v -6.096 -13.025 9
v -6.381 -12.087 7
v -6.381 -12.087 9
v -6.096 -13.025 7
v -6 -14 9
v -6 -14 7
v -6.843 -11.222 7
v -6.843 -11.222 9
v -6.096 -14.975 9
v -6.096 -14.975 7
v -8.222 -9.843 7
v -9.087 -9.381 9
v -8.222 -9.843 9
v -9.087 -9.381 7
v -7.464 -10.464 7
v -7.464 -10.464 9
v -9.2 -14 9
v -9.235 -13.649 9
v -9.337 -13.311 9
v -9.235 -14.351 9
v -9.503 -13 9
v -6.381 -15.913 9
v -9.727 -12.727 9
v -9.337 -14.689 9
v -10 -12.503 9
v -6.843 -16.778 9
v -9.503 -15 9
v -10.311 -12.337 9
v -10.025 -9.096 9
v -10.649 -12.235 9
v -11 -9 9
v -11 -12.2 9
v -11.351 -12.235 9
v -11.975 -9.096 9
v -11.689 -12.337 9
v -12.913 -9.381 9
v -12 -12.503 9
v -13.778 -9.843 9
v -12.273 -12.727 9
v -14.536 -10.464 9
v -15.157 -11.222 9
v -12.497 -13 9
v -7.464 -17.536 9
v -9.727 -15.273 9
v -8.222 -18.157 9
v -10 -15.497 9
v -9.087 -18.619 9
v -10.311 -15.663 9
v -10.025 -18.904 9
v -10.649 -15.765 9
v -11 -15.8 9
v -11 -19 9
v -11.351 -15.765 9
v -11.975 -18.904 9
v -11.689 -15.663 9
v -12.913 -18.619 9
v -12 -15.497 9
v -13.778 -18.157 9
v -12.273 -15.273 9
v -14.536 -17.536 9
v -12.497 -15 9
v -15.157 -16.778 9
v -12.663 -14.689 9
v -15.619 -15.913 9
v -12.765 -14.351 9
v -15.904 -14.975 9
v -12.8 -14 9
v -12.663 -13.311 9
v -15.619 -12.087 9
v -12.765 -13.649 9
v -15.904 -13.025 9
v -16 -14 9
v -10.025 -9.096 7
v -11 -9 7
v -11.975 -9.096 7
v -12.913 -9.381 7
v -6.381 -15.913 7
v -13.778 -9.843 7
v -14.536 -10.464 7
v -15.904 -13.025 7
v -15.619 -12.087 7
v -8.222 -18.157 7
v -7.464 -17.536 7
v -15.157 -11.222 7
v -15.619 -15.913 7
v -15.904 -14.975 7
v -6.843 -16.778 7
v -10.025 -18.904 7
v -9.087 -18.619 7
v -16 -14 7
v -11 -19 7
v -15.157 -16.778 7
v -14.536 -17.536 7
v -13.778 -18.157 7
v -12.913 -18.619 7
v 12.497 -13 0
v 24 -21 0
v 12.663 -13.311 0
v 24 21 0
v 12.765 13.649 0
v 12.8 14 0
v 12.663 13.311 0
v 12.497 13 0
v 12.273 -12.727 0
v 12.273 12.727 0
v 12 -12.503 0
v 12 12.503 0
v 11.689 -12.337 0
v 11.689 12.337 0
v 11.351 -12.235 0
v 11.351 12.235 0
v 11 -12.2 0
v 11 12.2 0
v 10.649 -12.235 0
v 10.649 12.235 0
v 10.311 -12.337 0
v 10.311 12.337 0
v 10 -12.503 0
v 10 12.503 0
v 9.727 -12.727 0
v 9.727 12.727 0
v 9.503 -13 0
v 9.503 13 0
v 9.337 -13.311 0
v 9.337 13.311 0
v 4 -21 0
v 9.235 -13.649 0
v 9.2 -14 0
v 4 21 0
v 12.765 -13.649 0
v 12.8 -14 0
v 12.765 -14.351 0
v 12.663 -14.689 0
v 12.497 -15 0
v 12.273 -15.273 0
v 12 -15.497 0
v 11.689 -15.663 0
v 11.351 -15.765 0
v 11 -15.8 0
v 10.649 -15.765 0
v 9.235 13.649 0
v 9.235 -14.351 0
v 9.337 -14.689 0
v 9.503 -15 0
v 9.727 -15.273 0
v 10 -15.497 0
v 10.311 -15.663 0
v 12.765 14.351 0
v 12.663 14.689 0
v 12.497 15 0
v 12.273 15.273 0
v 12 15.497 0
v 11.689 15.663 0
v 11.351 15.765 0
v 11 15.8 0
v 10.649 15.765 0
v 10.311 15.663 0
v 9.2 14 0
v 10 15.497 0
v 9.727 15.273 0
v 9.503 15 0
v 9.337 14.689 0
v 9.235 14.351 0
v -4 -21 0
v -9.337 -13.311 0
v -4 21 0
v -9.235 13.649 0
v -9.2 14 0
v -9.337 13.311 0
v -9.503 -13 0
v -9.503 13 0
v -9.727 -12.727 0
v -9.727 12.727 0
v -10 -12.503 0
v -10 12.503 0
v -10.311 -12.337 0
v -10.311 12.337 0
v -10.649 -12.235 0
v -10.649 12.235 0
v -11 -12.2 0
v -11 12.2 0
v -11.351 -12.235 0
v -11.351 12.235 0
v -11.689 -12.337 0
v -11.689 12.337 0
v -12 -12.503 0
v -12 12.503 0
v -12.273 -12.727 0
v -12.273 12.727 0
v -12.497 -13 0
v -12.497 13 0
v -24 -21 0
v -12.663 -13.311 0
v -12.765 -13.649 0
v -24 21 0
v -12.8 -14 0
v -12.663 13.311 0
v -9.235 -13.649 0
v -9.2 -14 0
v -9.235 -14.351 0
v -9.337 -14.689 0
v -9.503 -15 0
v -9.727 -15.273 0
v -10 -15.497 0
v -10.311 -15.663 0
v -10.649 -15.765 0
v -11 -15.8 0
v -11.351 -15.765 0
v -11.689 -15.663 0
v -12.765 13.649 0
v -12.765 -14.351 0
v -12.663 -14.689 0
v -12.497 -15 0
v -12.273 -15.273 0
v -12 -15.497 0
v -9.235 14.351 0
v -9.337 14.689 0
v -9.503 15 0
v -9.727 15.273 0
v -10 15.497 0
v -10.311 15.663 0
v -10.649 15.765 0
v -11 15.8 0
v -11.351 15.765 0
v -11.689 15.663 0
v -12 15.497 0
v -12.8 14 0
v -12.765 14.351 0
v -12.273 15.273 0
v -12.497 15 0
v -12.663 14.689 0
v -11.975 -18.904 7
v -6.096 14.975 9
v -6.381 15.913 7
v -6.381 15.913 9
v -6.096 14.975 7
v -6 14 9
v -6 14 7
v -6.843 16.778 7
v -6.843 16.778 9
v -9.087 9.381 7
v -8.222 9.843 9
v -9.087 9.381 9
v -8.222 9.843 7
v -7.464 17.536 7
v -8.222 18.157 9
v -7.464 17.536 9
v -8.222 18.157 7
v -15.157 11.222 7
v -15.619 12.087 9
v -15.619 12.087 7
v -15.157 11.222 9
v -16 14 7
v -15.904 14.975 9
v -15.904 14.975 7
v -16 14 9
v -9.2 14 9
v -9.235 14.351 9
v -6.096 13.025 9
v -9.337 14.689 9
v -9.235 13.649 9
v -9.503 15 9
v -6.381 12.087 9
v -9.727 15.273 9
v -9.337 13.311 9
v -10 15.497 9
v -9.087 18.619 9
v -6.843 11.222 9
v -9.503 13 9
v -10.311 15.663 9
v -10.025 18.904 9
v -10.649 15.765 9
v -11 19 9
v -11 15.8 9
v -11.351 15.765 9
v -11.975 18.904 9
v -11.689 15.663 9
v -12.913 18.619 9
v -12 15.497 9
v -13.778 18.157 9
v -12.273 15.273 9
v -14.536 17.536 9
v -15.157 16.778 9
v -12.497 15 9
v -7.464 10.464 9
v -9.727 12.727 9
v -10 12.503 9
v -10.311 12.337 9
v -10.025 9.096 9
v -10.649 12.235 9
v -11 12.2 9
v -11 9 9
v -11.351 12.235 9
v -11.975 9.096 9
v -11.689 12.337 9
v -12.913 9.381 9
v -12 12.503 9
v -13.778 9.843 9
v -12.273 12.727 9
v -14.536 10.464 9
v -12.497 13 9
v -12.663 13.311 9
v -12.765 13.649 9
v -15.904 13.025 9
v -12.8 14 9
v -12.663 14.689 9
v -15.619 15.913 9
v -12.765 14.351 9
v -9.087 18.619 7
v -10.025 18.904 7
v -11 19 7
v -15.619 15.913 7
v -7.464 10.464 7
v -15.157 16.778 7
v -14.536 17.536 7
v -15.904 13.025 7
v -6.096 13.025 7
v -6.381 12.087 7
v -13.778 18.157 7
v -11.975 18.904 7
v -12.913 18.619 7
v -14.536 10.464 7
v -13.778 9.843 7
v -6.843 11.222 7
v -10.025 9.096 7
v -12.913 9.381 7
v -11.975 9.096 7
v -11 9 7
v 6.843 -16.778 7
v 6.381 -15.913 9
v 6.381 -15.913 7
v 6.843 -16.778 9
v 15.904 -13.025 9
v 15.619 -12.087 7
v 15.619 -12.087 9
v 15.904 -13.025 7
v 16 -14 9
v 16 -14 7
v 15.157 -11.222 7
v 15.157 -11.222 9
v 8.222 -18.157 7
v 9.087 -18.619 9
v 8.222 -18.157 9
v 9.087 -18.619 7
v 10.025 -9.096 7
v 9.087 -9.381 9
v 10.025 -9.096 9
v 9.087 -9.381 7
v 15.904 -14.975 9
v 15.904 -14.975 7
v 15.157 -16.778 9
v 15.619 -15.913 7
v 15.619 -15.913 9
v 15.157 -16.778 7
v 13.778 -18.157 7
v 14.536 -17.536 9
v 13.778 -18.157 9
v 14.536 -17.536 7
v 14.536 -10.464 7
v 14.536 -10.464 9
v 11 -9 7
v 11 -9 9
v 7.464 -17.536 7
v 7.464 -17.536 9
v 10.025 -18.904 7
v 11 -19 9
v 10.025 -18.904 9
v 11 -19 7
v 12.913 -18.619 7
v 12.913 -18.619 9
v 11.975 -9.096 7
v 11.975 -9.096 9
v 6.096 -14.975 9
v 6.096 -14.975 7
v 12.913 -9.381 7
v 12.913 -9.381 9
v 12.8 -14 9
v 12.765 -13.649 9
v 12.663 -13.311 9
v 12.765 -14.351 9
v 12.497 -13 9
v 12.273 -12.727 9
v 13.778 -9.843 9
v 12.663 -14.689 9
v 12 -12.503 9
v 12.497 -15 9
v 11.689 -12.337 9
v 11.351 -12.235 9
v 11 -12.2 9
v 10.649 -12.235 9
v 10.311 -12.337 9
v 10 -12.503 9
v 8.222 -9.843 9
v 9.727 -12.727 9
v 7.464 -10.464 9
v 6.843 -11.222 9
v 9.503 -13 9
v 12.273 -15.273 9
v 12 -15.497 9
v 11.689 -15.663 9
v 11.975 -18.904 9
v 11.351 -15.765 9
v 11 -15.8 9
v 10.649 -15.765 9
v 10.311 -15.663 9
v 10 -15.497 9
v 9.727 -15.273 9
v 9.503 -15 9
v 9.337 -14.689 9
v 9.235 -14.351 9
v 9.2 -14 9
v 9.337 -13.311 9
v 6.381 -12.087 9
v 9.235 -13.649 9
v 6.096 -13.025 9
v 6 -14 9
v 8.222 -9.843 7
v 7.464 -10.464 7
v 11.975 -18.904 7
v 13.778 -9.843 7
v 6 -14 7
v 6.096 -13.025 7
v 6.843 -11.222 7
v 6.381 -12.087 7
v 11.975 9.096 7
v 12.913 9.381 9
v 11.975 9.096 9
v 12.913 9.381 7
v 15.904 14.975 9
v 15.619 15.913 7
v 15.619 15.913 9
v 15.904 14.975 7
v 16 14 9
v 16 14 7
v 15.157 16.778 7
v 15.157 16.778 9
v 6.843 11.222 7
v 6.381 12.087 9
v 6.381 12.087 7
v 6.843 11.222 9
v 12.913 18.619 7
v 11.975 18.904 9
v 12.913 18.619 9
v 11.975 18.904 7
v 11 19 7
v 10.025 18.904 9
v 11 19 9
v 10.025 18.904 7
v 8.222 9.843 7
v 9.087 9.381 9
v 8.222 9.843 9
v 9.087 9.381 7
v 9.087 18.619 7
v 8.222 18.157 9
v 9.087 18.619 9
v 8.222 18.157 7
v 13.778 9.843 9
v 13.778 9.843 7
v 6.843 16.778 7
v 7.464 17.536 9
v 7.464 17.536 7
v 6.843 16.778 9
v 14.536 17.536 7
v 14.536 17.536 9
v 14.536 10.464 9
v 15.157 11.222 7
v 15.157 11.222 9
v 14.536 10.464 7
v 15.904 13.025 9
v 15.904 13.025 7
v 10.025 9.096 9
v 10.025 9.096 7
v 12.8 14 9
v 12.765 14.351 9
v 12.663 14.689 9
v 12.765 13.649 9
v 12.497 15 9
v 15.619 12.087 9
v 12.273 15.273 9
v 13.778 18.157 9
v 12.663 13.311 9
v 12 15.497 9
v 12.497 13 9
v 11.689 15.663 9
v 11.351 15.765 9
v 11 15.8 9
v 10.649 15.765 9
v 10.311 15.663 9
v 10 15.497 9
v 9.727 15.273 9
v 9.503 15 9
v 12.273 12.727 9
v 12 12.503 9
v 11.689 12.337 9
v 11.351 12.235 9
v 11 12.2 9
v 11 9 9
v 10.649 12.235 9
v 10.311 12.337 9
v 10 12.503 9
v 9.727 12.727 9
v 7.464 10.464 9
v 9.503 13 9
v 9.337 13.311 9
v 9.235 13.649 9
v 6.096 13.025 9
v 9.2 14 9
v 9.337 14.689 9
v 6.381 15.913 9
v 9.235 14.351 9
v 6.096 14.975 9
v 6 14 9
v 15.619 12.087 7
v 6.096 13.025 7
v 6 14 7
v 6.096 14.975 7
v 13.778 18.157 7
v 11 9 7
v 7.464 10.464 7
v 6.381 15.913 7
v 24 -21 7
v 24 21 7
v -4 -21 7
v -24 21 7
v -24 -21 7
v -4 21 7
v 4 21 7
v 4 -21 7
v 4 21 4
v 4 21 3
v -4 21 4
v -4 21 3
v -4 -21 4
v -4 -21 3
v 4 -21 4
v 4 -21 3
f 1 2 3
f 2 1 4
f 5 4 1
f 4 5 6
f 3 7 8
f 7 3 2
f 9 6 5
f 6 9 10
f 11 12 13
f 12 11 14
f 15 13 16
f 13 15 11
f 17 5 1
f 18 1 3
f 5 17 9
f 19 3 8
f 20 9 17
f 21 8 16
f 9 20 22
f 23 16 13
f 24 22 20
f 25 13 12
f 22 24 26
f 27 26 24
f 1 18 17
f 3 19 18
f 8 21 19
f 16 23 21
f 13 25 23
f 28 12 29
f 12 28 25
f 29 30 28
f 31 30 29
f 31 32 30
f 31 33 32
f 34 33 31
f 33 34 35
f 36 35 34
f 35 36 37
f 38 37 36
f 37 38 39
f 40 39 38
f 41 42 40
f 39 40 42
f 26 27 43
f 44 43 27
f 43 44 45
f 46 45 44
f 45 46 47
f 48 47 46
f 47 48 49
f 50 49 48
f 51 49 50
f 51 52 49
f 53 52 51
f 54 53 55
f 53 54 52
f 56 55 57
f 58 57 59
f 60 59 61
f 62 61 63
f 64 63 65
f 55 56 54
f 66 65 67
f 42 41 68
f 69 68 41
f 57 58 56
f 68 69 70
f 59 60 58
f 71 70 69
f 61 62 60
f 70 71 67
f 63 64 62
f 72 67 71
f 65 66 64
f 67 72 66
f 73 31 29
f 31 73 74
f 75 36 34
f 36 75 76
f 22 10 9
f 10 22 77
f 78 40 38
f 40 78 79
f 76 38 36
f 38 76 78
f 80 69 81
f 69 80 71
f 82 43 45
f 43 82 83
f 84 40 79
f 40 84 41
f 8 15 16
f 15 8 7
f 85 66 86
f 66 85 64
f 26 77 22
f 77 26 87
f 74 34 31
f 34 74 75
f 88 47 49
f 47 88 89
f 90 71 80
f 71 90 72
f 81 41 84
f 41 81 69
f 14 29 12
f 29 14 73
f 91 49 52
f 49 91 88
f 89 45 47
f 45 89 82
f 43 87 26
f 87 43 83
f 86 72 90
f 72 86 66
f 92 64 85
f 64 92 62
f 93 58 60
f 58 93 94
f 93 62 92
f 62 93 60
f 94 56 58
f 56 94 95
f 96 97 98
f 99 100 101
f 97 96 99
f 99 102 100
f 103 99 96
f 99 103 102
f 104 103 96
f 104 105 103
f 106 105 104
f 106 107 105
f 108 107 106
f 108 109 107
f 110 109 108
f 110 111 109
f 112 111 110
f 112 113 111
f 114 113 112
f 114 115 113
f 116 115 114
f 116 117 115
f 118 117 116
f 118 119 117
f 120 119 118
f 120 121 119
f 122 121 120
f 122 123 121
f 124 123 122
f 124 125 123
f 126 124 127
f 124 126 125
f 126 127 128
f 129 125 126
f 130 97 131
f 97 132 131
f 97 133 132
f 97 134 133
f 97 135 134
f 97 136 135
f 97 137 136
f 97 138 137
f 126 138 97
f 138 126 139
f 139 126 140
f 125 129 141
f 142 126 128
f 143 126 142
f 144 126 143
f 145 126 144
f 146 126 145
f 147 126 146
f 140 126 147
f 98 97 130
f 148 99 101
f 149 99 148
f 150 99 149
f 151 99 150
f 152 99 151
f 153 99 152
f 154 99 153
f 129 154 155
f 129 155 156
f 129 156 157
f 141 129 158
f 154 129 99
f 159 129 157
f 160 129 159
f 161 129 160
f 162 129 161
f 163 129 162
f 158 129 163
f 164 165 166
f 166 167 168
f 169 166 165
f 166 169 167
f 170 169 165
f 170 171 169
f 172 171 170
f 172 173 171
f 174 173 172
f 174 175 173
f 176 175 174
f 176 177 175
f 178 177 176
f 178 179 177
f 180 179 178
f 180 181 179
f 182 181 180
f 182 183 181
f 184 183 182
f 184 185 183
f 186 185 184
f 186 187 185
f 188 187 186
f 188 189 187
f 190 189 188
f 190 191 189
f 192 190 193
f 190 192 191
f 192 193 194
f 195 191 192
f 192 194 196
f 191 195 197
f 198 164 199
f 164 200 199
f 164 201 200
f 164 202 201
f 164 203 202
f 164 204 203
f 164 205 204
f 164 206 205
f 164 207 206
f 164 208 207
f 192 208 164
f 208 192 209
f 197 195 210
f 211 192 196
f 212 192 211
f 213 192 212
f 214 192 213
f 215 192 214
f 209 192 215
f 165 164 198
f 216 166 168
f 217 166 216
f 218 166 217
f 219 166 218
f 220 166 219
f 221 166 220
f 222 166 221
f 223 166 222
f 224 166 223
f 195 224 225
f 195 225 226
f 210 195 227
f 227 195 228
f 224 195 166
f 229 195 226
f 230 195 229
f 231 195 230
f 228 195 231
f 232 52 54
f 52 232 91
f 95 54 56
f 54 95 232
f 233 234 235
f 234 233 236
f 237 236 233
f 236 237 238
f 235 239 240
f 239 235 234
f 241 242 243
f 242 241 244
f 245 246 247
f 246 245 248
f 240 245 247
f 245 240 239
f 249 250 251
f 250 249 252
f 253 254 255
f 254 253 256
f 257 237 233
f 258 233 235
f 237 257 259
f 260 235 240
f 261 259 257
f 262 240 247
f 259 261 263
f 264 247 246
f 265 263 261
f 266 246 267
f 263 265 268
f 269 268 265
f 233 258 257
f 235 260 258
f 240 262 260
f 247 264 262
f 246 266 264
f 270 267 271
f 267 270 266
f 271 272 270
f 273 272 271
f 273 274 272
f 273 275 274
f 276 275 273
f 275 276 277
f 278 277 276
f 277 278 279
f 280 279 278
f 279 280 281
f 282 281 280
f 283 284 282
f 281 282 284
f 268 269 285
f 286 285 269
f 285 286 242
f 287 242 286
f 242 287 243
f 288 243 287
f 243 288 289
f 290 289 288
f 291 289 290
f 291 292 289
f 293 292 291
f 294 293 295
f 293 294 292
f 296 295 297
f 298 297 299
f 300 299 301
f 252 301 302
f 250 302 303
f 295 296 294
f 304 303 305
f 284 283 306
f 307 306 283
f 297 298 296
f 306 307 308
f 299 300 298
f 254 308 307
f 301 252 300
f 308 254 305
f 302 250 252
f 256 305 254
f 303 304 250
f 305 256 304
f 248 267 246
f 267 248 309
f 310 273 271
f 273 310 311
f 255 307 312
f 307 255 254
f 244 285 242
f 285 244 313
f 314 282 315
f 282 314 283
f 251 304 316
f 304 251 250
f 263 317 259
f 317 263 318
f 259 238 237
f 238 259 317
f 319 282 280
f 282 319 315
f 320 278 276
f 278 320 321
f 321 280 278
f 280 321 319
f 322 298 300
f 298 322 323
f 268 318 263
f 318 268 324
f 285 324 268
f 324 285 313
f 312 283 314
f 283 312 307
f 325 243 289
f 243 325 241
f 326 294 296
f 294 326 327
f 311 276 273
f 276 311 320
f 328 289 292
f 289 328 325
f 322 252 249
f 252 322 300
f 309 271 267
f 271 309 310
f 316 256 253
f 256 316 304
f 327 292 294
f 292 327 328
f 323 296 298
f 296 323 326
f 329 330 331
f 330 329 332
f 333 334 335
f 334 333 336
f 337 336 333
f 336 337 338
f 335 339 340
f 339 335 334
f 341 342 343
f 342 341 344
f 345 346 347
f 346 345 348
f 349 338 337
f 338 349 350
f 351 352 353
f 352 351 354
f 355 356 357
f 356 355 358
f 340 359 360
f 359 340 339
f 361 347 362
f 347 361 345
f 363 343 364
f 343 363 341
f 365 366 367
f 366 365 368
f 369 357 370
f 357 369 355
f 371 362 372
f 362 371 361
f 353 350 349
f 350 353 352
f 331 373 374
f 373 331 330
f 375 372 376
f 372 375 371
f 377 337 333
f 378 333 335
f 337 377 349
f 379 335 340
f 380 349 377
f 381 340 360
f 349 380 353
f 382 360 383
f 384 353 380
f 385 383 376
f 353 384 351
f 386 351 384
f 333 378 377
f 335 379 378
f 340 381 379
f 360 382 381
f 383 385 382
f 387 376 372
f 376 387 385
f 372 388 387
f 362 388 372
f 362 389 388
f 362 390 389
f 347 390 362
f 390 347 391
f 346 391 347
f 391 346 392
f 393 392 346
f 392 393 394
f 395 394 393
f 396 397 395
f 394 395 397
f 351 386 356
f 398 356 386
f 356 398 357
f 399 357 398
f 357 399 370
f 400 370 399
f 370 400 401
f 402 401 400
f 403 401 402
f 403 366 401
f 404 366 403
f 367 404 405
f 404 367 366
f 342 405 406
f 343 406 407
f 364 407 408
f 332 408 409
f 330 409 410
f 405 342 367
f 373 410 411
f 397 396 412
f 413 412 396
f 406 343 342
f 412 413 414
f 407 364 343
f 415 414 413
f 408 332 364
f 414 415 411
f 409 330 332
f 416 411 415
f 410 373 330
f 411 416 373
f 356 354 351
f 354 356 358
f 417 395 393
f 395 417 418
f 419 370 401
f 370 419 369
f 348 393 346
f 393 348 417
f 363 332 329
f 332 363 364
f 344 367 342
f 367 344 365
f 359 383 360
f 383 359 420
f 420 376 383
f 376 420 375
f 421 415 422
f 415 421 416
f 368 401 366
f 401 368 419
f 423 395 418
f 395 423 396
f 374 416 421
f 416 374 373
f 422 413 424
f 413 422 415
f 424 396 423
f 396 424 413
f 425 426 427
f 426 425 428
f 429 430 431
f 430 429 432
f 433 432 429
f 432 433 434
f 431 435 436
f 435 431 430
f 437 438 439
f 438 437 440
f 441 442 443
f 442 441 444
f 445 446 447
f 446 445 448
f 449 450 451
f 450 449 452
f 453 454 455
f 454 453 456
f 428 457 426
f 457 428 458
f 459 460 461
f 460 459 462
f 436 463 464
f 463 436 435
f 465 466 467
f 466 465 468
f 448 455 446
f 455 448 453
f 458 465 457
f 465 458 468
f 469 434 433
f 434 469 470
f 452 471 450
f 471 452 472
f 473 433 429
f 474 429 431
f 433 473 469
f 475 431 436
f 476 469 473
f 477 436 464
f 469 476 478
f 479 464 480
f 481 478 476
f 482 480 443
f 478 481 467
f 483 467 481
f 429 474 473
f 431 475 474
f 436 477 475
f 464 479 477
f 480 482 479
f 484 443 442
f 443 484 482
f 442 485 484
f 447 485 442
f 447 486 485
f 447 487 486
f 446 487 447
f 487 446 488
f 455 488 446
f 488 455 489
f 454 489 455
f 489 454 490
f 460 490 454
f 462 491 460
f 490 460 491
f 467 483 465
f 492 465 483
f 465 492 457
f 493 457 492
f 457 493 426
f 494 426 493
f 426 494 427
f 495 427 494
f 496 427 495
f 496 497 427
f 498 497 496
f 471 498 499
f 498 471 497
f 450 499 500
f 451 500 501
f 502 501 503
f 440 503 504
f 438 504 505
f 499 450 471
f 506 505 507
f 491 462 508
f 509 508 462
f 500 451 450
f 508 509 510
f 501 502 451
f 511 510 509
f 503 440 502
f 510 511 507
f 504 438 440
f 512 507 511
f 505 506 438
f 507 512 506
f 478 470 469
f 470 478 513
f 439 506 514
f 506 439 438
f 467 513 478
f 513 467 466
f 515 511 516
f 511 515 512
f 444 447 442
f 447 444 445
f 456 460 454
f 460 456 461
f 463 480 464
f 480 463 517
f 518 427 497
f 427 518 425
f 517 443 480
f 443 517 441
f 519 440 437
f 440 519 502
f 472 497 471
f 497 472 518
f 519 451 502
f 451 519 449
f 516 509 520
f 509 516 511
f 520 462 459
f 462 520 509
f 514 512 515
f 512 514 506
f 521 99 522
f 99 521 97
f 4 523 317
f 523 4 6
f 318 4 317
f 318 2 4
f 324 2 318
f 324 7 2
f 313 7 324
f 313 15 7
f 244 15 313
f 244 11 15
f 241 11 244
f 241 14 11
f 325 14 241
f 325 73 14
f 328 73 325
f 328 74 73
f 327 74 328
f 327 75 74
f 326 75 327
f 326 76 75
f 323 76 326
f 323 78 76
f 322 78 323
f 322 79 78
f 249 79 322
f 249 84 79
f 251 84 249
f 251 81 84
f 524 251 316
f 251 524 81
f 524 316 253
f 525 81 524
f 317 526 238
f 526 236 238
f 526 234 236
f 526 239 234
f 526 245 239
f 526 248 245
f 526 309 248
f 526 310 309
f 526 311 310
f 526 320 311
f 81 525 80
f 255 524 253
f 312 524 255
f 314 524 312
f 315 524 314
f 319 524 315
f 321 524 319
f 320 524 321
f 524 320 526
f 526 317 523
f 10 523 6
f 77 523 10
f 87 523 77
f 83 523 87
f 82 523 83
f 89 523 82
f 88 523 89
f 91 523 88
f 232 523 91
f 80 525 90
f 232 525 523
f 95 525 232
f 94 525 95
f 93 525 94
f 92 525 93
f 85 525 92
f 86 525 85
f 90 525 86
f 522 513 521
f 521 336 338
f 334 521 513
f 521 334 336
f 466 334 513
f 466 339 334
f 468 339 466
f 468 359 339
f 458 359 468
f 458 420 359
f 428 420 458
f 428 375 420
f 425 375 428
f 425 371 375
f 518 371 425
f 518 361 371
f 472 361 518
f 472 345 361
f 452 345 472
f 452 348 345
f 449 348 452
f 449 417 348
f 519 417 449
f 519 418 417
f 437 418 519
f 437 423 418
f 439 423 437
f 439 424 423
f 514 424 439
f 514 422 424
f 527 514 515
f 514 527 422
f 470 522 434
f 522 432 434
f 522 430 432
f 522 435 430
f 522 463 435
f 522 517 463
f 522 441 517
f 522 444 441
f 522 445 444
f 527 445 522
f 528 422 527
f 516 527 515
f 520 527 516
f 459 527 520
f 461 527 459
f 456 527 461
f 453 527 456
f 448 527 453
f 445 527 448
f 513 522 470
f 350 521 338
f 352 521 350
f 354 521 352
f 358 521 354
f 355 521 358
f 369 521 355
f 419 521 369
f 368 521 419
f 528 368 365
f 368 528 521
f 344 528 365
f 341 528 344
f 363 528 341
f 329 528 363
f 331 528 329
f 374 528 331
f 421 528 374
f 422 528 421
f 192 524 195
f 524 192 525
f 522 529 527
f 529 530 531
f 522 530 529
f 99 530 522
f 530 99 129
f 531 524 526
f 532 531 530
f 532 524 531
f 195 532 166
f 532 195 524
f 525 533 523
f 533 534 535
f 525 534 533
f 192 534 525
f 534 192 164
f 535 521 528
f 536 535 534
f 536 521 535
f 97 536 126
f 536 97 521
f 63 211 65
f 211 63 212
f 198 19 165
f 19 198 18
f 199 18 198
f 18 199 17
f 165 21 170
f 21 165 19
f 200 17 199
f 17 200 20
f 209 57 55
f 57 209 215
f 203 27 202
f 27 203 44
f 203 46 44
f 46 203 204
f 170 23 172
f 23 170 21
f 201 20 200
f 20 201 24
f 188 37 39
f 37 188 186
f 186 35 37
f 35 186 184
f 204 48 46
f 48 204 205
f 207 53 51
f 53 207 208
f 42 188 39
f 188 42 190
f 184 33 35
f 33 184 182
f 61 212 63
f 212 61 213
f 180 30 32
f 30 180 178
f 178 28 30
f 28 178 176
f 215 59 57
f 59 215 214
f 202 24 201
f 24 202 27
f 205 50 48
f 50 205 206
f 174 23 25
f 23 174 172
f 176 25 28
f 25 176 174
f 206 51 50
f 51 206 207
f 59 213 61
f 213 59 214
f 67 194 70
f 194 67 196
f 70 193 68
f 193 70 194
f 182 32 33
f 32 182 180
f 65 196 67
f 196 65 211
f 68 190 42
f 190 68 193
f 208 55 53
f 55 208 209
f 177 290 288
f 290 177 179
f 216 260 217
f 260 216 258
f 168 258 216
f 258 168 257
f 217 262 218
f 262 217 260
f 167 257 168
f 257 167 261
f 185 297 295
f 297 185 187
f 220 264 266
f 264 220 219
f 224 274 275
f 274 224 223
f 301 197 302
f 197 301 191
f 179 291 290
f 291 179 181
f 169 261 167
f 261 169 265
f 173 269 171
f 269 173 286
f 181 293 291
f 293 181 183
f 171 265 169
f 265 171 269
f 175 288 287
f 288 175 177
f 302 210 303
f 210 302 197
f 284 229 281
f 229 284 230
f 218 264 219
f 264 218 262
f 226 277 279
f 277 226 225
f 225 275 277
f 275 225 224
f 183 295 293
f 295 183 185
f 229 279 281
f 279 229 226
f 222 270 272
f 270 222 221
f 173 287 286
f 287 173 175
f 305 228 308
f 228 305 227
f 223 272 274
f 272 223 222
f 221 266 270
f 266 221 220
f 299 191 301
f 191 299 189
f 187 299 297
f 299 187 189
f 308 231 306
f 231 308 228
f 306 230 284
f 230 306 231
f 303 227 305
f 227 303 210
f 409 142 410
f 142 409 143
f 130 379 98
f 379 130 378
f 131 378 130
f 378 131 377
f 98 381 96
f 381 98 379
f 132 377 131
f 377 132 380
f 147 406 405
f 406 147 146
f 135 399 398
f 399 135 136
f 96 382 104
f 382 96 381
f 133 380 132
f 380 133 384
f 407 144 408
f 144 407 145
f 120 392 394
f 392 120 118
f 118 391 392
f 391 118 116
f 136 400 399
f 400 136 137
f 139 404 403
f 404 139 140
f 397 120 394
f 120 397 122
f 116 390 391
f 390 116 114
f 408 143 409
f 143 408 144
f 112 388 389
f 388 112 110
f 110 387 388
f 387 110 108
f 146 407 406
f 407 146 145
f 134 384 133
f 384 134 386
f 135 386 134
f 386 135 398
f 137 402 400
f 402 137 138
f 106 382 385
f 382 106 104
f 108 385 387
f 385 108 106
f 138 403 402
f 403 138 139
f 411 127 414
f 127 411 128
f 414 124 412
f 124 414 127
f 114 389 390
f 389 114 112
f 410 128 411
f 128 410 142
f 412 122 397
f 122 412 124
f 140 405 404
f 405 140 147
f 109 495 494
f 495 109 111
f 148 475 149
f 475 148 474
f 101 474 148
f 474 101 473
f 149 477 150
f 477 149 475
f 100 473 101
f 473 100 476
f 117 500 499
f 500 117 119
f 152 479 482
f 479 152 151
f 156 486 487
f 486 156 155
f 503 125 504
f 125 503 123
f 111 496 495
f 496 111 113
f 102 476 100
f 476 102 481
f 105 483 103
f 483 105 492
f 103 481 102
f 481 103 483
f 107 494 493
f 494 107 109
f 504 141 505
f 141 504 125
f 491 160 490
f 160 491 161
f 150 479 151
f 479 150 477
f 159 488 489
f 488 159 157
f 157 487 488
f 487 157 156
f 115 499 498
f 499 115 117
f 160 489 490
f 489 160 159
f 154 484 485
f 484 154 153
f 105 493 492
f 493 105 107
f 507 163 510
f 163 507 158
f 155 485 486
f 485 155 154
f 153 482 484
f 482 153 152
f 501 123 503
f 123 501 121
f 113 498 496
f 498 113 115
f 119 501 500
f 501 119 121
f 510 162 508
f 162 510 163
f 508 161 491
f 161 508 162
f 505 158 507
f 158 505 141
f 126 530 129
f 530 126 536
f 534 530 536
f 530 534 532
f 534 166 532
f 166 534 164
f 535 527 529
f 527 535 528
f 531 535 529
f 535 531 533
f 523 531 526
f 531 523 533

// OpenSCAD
$fn = 32;

// ----------------------------------------------------------------------
// Living hinge: 48 x 42 mm plates, 1 mm flexible web
// ----------------------------------------------------------------------

// --- parameters (mm) ---
plate_len = 20;           // plate length outside the web
plate_w = 42;             // plate width
thick = 7;                // plate thickness
web_half = 4;             // half width of the flex band
web_t = 1;                // flexible web thickness
web_z = 3;                // web position inside the thickness
boss_d = 10;              // screw boss diameter
boss_h = 9;               // screw boss height
boss_x = 11;              // screw boss distance from the web
screw_d = 3.6;            // screw hole

difference() {
  union() {
    /* one flat strip, later thinned at the middle */
    translate([-24, -21, 0]) cube([48, 42, 7]);
    /* screw bosses, sunk 0.5 mm into the plates */
    for (sx = [-11, 11]) {
      for (sy = [-14, 14]) {
        translate([sx, sy, 0]) cylinder(h = boss_h, d = boss_d);
      }
    }
  }
  /* channel from below: leaves the web on top of it */
  translate([-4, -23.5, -2.5]) cube([8, 47, 5.5]);
  /* channel from above: thins the web down to web_t */
  translate([-4, -23.5, 4]) cube([8, 47, 5.5]);
  /* screw holes through the bosses */
  for (sx = [-11, 11]) {
    for (sy = [-14, 14]) {
      translate([sx, sy, -2.5]) cylinder(h = boss_h + 5, d = screw_d);
    }
  }
}
